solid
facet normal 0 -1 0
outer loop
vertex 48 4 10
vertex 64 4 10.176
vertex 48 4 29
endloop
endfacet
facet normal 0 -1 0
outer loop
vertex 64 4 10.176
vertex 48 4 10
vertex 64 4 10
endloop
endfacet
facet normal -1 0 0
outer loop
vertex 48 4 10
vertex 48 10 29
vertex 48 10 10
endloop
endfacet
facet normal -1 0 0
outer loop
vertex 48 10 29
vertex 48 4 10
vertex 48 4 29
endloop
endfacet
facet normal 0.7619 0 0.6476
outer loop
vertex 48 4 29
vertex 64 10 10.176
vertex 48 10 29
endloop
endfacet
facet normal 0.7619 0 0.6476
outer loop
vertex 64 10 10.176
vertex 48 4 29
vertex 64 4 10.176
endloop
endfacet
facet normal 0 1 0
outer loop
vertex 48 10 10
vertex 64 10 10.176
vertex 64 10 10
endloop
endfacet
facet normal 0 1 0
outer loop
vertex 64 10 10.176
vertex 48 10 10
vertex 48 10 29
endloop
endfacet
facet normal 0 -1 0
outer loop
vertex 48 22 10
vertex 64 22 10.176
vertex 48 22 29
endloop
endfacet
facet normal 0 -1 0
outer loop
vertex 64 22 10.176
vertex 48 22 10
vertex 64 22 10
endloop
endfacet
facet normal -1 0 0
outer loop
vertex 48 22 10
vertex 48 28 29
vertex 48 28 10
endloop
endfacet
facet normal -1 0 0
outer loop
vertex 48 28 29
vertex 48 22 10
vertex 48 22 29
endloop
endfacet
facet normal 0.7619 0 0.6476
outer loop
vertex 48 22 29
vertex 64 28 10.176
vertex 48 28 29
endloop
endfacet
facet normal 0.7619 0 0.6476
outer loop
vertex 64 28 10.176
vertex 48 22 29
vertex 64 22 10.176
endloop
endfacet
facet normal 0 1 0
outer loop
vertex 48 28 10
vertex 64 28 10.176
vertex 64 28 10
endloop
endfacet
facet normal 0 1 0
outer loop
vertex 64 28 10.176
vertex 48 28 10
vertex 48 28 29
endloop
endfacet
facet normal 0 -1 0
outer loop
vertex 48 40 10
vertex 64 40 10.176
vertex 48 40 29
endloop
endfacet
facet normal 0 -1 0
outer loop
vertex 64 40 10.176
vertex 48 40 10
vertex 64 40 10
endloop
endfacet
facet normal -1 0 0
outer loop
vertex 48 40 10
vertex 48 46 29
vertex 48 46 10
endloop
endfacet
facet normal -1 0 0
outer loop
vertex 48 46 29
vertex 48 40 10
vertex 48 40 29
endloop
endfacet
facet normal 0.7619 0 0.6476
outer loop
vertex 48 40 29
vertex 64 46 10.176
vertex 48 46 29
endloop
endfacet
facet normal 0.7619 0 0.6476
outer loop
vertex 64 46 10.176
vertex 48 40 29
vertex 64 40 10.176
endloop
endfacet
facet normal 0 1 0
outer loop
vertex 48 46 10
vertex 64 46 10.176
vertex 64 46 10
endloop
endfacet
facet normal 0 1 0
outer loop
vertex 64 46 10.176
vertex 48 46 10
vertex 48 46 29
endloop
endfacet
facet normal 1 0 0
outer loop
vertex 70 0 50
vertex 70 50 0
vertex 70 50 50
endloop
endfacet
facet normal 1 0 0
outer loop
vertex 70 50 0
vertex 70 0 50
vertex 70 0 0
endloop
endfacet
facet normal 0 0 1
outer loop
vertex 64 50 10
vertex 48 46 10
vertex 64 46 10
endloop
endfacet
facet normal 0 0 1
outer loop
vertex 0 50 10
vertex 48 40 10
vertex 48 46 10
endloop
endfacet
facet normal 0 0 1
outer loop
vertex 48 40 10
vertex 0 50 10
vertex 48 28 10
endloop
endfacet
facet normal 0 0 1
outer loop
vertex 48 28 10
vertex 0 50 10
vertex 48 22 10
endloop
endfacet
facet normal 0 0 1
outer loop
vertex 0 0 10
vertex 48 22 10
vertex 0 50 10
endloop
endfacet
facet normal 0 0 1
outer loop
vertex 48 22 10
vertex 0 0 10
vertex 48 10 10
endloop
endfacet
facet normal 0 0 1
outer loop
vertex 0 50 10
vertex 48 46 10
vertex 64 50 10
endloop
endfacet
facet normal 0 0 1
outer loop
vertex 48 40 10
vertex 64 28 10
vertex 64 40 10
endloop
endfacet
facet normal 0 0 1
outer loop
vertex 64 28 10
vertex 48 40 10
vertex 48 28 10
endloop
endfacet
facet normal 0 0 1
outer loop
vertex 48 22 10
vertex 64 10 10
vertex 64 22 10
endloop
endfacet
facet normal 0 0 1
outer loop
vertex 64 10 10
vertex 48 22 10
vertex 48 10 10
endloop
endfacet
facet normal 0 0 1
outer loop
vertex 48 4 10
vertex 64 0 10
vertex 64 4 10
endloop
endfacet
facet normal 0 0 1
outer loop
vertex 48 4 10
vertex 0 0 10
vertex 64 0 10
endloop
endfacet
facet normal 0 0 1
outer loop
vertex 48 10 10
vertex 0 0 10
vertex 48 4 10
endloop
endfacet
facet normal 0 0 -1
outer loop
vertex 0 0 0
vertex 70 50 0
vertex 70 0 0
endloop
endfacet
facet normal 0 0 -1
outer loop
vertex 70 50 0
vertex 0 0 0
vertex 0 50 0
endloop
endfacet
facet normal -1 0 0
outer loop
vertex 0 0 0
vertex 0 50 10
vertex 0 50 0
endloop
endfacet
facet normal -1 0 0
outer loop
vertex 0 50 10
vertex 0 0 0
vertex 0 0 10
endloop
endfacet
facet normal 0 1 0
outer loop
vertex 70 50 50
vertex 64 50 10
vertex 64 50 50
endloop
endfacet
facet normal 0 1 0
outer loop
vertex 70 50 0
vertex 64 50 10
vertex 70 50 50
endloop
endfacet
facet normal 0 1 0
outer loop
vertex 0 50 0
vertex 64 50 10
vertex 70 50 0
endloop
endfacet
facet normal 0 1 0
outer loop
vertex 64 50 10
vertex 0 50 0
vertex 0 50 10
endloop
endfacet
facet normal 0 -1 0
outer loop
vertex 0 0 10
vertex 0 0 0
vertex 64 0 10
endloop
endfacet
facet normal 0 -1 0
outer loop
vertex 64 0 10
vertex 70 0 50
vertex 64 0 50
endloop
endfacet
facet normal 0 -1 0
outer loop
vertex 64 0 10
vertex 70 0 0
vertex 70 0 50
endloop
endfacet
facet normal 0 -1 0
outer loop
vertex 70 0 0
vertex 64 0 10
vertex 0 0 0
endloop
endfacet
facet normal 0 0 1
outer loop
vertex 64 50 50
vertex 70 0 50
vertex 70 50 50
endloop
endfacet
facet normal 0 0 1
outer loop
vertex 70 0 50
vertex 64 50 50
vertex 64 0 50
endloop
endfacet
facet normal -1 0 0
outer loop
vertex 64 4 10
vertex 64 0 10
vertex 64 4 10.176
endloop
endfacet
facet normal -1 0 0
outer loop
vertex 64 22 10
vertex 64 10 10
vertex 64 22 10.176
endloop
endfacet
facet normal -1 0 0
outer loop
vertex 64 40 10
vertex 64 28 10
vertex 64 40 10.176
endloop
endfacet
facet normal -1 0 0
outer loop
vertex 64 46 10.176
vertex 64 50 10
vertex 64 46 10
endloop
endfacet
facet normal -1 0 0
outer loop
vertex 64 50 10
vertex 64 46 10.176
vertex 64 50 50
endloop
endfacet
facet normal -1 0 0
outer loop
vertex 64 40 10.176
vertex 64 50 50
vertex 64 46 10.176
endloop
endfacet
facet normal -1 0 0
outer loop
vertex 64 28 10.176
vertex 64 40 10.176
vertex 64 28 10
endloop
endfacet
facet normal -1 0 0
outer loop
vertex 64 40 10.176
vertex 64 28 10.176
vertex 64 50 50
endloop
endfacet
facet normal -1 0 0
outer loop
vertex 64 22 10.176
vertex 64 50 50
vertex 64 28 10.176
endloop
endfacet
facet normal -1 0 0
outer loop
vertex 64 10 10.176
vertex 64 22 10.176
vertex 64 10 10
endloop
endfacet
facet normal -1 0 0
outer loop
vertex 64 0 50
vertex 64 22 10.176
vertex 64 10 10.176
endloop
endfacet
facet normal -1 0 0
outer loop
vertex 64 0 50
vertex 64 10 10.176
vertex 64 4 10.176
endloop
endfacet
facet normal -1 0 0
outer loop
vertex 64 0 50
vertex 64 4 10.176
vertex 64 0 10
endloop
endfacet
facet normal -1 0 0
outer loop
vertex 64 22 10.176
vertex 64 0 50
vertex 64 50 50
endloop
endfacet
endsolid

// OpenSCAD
$fn = 32;

// ----------------------------------------------------------------------
// Rib bracket: 3-gusset L bracket
// ----------------------------------------------------------------------

// --- parameters (mm) ---
base_l = 70;              // foot length, X
base_w = 50;              // foot width, Y
base_t = 10;              // foot thickness
plate_t = 6;              // upright plate thickness
plate_h = 50;             // overall height
gus_l = 16;               // gusset leg along the foot
gus_h = 20;               // gusset height
gus_t = 6;                // gusset thickness
gus_edge = 4;             // gusset margin from the foot edge
n_gus = 3;                // gusset count

gus_pitch = (base_w - 2 * gus_edge - gus_t) / (n_gus - 1);  // gusset pitch

union() {
  cube([base_l, base_w, base_t]);
  translate([base_l - plate_t, 0, base_t - 1])
    cube([plate_t, base_w, plate_h - base_t + 1]);
  for (i = [0 : n_gus - 1])
    translate([base_l - plate_t - gus_l, gus_edge + i * gus_pitch, base_t - 1])
      rotate([-90, 0, 0])
        linear_extrude(height = gus_t)
          polygon(points = [[0, 0], [gus_l + 1, 0], [0, -gus_h]]);
}
